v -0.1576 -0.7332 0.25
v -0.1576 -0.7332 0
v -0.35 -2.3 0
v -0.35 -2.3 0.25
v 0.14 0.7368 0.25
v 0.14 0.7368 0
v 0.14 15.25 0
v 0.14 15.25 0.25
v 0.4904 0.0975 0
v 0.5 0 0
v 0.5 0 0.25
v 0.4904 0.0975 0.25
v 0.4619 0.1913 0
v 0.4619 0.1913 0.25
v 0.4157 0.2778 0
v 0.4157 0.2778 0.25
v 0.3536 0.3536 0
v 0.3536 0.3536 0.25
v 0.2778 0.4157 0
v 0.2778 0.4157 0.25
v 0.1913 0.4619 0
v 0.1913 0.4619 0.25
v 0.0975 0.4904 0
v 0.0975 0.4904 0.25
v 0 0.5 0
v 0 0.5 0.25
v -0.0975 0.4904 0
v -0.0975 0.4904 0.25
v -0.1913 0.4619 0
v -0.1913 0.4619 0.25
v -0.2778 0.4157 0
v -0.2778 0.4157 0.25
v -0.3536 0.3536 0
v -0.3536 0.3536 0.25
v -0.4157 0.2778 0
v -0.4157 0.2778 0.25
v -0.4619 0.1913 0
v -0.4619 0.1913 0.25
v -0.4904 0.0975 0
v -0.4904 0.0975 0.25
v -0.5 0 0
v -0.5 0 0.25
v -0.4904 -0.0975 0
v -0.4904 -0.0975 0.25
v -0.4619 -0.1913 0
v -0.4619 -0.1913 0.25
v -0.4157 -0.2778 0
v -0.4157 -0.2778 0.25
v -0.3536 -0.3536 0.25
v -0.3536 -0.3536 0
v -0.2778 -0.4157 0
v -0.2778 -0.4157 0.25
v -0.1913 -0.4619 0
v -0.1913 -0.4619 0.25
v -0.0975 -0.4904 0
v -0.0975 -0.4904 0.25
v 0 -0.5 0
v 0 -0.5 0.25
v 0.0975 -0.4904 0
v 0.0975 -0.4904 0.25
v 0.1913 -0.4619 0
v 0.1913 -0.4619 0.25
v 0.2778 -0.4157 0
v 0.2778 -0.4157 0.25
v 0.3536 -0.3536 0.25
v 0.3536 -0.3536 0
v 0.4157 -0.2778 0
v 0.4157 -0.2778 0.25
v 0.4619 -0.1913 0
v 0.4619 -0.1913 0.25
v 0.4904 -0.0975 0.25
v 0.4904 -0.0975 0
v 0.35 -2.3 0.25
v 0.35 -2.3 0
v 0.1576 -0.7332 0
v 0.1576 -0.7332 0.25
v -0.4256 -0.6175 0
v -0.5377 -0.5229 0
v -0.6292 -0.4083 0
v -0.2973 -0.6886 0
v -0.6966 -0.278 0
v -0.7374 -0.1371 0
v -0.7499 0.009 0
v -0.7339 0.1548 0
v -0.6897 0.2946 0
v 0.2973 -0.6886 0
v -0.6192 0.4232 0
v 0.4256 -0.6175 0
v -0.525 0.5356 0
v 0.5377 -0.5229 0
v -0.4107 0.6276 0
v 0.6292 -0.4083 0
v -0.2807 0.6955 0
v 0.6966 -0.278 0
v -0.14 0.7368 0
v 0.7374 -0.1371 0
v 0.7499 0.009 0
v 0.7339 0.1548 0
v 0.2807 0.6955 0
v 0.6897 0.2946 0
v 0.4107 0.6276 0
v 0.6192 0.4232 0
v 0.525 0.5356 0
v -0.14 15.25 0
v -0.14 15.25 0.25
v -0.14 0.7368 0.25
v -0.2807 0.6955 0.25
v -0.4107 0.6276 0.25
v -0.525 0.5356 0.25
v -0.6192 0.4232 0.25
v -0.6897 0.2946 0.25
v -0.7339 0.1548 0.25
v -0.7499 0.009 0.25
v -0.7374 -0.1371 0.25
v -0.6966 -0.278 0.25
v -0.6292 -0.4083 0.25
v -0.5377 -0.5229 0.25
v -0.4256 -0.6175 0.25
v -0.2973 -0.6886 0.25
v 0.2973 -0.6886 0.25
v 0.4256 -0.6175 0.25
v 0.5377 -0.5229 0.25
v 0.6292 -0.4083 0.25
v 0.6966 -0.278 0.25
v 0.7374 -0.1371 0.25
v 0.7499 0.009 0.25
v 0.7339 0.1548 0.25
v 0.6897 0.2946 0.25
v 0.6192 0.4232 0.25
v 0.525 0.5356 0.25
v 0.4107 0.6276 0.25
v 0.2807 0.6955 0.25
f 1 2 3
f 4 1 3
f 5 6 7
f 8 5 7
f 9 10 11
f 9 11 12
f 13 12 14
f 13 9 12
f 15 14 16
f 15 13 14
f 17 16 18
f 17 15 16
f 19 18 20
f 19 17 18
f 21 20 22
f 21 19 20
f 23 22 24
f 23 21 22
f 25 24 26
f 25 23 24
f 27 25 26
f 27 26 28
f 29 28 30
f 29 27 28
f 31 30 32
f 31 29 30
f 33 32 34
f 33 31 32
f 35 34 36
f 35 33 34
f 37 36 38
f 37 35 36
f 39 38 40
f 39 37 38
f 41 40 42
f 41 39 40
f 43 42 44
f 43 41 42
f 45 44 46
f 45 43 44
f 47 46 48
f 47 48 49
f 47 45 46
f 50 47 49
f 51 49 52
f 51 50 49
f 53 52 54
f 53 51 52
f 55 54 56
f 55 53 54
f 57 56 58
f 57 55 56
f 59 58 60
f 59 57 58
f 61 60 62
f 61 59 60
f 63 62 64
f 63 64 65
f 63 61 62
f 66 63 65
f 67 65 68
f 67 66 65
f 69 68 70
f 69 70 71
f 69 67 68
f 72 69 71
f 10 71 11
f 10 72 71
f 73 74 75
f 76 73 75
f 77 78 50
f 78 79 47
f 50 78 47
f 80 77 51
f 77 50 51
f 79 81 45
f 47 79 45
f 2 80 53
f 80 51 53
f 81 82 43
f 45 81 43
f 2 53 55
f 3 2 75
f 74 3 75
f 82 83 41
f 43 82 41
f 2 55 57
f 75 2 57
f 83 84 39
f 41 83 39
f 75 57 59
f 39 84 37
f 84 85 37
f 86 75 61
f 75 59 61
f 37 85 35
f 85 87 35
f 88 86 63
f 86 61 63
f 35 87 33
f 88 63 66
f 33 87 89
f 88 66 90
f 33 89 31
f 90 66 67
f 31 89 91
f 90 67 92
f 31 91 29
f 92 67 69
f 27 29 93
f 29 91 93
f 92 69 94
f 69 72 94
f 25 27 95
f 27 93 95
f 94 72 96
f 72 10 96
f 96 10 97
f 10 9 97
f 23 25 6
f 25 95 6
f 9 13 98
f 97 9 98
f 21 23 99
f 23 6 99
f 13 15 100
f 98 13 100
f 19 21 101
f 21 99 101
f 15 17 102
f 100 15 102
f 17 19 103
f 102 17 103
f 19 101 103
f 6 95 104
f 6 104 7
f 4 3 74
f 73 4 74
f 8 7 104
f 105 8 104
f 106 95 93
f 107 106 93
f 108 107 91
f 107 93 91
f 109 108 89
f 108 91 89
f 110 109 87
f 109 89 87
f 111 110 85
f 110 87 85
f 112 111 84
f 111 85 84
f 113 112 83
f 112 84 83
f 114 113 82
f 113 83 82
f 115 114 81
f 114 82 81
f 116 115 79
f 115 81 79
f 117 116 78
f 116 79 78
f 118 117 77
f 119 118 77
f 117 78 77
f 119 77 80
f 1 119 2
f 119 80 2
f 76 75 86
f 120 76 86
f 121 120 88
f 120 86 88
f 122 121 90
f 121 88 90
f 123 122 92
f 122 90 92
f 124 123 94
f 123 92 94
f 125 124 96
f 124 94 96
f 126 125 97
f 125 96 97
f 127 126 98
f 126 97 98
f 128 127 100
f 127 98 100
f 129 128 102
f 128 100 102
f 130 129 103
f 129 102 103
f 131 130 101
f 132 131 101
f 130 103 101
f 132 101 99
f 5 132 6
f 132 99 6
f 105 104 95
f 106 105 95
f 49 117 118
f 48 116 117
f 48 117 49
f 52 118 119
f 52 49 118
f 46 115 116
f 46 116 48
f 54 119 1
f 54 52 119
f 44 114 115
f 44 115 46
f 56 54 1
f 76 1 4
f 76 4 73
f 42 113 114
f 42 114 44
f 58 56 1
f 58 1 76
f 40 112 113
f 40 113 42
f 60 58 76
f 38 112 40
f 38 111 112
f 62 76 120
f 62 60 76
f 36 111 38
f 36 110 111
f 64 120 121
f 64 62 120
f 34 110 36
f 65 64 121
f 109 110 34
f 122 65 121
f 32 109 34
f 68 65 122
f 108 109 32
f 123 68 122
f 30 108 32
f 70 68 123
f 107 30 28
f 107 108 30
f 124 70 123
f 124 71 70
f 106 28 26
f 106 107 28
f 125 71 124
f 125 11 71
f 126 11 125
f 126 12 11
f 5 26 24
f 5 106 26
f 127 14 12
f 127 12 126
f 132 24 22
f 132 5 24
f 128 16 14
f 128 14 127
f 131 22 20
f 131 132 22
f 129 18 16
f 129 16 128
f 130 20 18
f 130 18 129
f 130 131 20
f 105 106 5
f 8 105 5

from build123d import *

# Parameters (mm, degrees)
F0_R     = 0.5
F1_DEPTH = 0.25


with BuildPart() as f1:
    # F0 (on Top) → F1 (new body)
    with BuildSketch(Plane.XY):
        with BuildLine():
            Line((0.35, -2.3), (0.157627, -0.733249))
            ThreePointArc((0.157627, -0.733249), (0.749946, 0.008992), (0.14, 0.736817))
            Line((0.14, 0.736817), (0.14, 15.25))
            Line((0.14, 15.25), (0, 15.25))
            Line((0, 15.25), (-0.14, 15.25))
            Line((-0.14, 15.25), (-0.14, 0.736817))
            ThreePointArc((-0.14, 0.736817), (-0.749946, 0.008992), (-0.157627, -0.733249))
            Line((-0.157627, -0.733249), (-0.35, -2.3))
            Line((-0.35, -2.3), (0, -2.3))
            Line((0, -2.3), (0.35, -2.3))
        make_face()
        Circle(F0_R, mode=Mode.SUBTRACT)
    extrude(amount=F1_DEPTH)


solid = f1.part
